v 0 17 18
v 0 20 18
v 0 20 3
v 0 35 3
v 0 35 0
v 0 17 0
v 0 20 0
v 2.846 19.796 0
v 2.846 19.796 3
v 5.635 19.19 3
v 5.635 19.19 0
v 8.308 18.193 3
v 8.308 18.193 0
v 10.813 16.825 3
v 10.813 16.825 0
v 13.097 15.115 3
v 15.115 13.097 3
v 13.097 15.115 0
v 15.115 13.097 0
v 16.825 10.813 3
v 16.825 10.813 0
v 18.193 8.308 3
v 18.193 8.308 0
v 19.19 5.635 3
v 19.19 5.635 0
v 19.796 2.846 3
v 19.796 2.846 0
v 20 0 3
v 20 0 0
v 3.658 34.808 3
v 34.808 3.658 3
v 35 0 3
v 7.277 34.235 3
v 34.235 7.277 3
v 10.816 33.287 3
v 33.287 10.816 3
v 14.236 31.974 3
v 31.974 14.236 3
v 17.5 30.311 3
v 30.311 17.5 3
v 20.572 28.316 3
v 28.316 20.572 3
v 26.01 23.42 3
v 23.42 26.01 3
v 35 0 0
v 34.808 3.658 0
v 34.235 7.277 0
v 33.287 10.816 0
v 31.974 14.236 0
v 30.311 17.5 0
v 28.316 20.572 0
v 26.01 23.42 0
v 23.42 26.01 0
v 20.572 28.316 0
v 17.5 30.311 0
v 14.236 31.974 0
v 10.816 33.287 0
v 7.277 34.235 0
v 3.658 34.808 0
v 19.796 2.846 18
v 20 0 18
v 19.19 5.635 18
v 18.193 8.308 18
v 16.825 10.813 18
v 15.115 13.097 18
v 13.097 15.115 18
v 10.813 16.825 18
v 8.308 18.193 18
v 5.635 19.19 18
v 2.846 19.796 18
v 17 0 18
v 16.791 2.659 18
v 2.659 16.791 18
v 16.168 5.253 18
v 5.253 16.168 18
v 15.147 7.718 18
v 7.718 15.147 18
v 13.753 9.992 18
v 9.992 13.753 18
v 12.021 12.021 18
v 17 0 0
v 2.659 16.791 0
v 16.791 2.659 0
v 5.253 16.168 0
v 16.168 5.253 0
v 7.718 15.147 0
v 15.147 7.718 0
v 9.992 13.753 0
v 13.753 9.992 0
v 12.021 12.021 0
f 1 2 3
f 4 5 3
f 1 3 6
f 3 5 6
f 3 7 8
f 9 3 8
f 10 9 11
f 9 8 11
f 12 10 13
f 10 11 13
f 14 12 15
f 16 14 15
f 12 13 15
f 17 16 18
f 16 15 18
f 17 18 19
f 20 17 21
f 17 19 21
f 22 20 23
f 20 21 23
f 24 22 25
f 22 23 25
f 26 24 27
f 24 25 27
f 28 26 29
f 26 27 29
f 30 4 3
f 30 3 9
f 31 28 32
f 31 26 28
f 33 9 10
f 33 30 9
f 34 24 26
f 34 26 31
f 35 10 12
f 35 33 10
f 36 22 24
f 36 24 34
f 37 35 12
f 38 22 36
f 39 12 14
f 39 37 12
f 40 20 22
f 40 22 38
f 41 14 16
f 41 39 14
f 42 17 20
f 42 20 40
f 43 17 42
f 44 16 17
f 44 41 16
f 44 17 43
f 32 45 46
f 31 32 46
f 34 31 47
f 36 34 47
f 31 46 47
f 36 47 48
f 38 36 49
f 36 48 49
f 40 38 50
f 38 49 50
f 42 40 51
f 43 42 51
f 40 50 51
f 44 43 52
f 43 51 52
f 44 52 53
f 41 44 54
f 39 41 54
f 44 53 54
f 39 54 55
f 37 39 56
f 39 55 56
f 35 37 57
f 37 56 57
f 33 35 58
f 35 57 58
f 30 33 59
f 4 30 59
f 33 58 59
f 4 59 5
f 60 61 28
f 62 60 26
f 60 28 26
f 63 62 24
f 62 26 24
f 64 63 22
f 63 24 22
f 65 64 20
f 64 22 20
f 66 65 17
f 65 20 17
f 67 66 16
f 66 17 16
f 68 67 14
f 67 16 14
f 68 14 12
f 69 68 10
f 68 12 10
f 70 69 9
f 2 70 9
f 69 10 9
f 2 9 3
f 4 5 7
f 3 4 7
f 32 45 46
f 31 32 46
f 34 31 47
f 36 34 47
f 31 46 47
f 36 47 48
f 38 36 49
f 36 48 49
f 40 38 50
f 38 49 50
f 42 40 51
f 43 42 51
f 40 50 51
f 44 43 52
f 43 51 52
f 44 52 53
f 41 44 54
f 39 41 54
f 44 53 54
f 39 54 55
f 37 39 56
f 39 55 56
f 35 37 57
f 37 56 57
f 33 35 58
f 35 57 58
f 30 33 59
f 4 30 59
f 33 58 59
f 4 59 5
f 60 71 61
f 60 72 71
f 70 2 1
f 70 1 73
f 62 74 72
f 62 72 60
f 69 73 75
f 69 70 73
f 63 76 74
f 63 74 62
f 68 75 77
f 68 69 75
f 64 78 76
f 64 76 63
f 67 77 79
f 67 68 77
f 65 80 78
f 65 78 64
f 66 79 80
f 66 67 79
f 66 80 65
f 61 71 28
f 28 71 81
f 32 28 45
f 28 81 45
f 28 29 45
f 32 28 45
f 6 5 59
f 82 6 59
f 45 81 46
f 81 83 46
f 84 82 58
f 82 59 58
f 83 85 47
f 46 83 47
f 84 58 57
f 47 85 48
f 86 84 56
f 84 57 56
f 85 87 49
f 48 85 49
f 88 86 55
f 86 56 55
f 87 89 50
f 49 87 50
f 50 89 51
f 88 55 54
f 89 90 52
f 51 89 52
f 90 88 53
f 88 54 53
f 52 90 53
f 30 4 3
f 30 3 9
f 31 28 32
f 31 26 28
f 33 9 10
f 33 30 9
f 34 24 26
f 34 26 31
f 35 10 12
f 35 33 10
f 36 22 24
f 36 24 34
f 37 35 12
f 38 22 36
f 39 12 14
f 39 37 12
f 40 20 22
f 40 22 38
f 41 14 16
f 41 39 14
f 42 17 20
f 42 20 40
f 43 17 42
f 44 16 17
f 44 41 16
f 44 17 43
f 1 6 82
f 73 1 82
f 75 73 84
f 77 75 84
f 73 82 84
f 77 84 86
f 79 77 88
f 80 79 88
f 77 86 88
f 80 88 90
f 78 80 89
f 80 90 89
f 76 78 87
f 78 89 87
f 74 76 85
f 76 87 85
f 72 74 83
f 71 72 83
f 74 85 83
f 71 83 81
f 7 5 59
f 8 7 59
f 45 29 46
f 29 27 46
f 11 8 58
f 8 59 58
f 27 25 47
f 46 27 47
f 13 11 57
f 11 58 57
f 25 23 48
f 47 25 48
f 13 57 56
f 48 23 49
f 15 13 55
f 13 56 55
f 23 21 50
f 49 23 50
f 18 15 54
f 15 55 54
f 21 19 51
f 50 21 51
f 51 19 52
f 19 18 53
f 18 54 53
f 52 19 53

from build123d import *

# Parameters (mm, degrees)
F2_DEPTH = 3
F3_DEPTH = 18
F4_DEPTH = 3


with BuildPart() as f2:
    # F0 (on Top) → F2 (new body)
    with BuildSketch(Plane.XY):
        with BuildLine():
            Line((20, 0), (35, 0))
            ThreePointArc((35, 0), (24.7487373415, 24.7487373415), (0, 35))
            Line((0, 35), (0, 20))
            ThreePointArc((0, 20), (14.1421356237, 14.1421356237), (20, 0))
        make_face()
    extrude(amount=F2_DEPTH)

    # F0 (on Top) → F3 (join)
    with BuildSketch(Plane.XY):
        with BuildLine():
            Line((17, 0), (20, 0))
            ThreePointArc((20, 0), (14.1421356237, 14.1421356237), (0, 20))
            Line((0, 20), (0, 17))
            ThreePointArc((0, 17), (12.0208152802, 12.0208152802), (17, 0))
        make_face()
    extrude(amount=F3_DEPTH)


with BuildPart() as f4:
    # F1 (on Top) → F4 (new body)
    with BuildSketch(Plane.XY):
        with BuildLine():
            Line((20, 0), (35, 0))
            ThreePointArc((35, 0), (24.7487373415, 24.7487373415), (0, 35))
            Line((0, 35), (0, 20))
            ThreePointArc((0, 20), (14.1421356237, 14.1421356237), (20, 0))
        make_face()
    extrude(amount=F4_DEPTH)


solid = Compound([f2.part, f4.part])
